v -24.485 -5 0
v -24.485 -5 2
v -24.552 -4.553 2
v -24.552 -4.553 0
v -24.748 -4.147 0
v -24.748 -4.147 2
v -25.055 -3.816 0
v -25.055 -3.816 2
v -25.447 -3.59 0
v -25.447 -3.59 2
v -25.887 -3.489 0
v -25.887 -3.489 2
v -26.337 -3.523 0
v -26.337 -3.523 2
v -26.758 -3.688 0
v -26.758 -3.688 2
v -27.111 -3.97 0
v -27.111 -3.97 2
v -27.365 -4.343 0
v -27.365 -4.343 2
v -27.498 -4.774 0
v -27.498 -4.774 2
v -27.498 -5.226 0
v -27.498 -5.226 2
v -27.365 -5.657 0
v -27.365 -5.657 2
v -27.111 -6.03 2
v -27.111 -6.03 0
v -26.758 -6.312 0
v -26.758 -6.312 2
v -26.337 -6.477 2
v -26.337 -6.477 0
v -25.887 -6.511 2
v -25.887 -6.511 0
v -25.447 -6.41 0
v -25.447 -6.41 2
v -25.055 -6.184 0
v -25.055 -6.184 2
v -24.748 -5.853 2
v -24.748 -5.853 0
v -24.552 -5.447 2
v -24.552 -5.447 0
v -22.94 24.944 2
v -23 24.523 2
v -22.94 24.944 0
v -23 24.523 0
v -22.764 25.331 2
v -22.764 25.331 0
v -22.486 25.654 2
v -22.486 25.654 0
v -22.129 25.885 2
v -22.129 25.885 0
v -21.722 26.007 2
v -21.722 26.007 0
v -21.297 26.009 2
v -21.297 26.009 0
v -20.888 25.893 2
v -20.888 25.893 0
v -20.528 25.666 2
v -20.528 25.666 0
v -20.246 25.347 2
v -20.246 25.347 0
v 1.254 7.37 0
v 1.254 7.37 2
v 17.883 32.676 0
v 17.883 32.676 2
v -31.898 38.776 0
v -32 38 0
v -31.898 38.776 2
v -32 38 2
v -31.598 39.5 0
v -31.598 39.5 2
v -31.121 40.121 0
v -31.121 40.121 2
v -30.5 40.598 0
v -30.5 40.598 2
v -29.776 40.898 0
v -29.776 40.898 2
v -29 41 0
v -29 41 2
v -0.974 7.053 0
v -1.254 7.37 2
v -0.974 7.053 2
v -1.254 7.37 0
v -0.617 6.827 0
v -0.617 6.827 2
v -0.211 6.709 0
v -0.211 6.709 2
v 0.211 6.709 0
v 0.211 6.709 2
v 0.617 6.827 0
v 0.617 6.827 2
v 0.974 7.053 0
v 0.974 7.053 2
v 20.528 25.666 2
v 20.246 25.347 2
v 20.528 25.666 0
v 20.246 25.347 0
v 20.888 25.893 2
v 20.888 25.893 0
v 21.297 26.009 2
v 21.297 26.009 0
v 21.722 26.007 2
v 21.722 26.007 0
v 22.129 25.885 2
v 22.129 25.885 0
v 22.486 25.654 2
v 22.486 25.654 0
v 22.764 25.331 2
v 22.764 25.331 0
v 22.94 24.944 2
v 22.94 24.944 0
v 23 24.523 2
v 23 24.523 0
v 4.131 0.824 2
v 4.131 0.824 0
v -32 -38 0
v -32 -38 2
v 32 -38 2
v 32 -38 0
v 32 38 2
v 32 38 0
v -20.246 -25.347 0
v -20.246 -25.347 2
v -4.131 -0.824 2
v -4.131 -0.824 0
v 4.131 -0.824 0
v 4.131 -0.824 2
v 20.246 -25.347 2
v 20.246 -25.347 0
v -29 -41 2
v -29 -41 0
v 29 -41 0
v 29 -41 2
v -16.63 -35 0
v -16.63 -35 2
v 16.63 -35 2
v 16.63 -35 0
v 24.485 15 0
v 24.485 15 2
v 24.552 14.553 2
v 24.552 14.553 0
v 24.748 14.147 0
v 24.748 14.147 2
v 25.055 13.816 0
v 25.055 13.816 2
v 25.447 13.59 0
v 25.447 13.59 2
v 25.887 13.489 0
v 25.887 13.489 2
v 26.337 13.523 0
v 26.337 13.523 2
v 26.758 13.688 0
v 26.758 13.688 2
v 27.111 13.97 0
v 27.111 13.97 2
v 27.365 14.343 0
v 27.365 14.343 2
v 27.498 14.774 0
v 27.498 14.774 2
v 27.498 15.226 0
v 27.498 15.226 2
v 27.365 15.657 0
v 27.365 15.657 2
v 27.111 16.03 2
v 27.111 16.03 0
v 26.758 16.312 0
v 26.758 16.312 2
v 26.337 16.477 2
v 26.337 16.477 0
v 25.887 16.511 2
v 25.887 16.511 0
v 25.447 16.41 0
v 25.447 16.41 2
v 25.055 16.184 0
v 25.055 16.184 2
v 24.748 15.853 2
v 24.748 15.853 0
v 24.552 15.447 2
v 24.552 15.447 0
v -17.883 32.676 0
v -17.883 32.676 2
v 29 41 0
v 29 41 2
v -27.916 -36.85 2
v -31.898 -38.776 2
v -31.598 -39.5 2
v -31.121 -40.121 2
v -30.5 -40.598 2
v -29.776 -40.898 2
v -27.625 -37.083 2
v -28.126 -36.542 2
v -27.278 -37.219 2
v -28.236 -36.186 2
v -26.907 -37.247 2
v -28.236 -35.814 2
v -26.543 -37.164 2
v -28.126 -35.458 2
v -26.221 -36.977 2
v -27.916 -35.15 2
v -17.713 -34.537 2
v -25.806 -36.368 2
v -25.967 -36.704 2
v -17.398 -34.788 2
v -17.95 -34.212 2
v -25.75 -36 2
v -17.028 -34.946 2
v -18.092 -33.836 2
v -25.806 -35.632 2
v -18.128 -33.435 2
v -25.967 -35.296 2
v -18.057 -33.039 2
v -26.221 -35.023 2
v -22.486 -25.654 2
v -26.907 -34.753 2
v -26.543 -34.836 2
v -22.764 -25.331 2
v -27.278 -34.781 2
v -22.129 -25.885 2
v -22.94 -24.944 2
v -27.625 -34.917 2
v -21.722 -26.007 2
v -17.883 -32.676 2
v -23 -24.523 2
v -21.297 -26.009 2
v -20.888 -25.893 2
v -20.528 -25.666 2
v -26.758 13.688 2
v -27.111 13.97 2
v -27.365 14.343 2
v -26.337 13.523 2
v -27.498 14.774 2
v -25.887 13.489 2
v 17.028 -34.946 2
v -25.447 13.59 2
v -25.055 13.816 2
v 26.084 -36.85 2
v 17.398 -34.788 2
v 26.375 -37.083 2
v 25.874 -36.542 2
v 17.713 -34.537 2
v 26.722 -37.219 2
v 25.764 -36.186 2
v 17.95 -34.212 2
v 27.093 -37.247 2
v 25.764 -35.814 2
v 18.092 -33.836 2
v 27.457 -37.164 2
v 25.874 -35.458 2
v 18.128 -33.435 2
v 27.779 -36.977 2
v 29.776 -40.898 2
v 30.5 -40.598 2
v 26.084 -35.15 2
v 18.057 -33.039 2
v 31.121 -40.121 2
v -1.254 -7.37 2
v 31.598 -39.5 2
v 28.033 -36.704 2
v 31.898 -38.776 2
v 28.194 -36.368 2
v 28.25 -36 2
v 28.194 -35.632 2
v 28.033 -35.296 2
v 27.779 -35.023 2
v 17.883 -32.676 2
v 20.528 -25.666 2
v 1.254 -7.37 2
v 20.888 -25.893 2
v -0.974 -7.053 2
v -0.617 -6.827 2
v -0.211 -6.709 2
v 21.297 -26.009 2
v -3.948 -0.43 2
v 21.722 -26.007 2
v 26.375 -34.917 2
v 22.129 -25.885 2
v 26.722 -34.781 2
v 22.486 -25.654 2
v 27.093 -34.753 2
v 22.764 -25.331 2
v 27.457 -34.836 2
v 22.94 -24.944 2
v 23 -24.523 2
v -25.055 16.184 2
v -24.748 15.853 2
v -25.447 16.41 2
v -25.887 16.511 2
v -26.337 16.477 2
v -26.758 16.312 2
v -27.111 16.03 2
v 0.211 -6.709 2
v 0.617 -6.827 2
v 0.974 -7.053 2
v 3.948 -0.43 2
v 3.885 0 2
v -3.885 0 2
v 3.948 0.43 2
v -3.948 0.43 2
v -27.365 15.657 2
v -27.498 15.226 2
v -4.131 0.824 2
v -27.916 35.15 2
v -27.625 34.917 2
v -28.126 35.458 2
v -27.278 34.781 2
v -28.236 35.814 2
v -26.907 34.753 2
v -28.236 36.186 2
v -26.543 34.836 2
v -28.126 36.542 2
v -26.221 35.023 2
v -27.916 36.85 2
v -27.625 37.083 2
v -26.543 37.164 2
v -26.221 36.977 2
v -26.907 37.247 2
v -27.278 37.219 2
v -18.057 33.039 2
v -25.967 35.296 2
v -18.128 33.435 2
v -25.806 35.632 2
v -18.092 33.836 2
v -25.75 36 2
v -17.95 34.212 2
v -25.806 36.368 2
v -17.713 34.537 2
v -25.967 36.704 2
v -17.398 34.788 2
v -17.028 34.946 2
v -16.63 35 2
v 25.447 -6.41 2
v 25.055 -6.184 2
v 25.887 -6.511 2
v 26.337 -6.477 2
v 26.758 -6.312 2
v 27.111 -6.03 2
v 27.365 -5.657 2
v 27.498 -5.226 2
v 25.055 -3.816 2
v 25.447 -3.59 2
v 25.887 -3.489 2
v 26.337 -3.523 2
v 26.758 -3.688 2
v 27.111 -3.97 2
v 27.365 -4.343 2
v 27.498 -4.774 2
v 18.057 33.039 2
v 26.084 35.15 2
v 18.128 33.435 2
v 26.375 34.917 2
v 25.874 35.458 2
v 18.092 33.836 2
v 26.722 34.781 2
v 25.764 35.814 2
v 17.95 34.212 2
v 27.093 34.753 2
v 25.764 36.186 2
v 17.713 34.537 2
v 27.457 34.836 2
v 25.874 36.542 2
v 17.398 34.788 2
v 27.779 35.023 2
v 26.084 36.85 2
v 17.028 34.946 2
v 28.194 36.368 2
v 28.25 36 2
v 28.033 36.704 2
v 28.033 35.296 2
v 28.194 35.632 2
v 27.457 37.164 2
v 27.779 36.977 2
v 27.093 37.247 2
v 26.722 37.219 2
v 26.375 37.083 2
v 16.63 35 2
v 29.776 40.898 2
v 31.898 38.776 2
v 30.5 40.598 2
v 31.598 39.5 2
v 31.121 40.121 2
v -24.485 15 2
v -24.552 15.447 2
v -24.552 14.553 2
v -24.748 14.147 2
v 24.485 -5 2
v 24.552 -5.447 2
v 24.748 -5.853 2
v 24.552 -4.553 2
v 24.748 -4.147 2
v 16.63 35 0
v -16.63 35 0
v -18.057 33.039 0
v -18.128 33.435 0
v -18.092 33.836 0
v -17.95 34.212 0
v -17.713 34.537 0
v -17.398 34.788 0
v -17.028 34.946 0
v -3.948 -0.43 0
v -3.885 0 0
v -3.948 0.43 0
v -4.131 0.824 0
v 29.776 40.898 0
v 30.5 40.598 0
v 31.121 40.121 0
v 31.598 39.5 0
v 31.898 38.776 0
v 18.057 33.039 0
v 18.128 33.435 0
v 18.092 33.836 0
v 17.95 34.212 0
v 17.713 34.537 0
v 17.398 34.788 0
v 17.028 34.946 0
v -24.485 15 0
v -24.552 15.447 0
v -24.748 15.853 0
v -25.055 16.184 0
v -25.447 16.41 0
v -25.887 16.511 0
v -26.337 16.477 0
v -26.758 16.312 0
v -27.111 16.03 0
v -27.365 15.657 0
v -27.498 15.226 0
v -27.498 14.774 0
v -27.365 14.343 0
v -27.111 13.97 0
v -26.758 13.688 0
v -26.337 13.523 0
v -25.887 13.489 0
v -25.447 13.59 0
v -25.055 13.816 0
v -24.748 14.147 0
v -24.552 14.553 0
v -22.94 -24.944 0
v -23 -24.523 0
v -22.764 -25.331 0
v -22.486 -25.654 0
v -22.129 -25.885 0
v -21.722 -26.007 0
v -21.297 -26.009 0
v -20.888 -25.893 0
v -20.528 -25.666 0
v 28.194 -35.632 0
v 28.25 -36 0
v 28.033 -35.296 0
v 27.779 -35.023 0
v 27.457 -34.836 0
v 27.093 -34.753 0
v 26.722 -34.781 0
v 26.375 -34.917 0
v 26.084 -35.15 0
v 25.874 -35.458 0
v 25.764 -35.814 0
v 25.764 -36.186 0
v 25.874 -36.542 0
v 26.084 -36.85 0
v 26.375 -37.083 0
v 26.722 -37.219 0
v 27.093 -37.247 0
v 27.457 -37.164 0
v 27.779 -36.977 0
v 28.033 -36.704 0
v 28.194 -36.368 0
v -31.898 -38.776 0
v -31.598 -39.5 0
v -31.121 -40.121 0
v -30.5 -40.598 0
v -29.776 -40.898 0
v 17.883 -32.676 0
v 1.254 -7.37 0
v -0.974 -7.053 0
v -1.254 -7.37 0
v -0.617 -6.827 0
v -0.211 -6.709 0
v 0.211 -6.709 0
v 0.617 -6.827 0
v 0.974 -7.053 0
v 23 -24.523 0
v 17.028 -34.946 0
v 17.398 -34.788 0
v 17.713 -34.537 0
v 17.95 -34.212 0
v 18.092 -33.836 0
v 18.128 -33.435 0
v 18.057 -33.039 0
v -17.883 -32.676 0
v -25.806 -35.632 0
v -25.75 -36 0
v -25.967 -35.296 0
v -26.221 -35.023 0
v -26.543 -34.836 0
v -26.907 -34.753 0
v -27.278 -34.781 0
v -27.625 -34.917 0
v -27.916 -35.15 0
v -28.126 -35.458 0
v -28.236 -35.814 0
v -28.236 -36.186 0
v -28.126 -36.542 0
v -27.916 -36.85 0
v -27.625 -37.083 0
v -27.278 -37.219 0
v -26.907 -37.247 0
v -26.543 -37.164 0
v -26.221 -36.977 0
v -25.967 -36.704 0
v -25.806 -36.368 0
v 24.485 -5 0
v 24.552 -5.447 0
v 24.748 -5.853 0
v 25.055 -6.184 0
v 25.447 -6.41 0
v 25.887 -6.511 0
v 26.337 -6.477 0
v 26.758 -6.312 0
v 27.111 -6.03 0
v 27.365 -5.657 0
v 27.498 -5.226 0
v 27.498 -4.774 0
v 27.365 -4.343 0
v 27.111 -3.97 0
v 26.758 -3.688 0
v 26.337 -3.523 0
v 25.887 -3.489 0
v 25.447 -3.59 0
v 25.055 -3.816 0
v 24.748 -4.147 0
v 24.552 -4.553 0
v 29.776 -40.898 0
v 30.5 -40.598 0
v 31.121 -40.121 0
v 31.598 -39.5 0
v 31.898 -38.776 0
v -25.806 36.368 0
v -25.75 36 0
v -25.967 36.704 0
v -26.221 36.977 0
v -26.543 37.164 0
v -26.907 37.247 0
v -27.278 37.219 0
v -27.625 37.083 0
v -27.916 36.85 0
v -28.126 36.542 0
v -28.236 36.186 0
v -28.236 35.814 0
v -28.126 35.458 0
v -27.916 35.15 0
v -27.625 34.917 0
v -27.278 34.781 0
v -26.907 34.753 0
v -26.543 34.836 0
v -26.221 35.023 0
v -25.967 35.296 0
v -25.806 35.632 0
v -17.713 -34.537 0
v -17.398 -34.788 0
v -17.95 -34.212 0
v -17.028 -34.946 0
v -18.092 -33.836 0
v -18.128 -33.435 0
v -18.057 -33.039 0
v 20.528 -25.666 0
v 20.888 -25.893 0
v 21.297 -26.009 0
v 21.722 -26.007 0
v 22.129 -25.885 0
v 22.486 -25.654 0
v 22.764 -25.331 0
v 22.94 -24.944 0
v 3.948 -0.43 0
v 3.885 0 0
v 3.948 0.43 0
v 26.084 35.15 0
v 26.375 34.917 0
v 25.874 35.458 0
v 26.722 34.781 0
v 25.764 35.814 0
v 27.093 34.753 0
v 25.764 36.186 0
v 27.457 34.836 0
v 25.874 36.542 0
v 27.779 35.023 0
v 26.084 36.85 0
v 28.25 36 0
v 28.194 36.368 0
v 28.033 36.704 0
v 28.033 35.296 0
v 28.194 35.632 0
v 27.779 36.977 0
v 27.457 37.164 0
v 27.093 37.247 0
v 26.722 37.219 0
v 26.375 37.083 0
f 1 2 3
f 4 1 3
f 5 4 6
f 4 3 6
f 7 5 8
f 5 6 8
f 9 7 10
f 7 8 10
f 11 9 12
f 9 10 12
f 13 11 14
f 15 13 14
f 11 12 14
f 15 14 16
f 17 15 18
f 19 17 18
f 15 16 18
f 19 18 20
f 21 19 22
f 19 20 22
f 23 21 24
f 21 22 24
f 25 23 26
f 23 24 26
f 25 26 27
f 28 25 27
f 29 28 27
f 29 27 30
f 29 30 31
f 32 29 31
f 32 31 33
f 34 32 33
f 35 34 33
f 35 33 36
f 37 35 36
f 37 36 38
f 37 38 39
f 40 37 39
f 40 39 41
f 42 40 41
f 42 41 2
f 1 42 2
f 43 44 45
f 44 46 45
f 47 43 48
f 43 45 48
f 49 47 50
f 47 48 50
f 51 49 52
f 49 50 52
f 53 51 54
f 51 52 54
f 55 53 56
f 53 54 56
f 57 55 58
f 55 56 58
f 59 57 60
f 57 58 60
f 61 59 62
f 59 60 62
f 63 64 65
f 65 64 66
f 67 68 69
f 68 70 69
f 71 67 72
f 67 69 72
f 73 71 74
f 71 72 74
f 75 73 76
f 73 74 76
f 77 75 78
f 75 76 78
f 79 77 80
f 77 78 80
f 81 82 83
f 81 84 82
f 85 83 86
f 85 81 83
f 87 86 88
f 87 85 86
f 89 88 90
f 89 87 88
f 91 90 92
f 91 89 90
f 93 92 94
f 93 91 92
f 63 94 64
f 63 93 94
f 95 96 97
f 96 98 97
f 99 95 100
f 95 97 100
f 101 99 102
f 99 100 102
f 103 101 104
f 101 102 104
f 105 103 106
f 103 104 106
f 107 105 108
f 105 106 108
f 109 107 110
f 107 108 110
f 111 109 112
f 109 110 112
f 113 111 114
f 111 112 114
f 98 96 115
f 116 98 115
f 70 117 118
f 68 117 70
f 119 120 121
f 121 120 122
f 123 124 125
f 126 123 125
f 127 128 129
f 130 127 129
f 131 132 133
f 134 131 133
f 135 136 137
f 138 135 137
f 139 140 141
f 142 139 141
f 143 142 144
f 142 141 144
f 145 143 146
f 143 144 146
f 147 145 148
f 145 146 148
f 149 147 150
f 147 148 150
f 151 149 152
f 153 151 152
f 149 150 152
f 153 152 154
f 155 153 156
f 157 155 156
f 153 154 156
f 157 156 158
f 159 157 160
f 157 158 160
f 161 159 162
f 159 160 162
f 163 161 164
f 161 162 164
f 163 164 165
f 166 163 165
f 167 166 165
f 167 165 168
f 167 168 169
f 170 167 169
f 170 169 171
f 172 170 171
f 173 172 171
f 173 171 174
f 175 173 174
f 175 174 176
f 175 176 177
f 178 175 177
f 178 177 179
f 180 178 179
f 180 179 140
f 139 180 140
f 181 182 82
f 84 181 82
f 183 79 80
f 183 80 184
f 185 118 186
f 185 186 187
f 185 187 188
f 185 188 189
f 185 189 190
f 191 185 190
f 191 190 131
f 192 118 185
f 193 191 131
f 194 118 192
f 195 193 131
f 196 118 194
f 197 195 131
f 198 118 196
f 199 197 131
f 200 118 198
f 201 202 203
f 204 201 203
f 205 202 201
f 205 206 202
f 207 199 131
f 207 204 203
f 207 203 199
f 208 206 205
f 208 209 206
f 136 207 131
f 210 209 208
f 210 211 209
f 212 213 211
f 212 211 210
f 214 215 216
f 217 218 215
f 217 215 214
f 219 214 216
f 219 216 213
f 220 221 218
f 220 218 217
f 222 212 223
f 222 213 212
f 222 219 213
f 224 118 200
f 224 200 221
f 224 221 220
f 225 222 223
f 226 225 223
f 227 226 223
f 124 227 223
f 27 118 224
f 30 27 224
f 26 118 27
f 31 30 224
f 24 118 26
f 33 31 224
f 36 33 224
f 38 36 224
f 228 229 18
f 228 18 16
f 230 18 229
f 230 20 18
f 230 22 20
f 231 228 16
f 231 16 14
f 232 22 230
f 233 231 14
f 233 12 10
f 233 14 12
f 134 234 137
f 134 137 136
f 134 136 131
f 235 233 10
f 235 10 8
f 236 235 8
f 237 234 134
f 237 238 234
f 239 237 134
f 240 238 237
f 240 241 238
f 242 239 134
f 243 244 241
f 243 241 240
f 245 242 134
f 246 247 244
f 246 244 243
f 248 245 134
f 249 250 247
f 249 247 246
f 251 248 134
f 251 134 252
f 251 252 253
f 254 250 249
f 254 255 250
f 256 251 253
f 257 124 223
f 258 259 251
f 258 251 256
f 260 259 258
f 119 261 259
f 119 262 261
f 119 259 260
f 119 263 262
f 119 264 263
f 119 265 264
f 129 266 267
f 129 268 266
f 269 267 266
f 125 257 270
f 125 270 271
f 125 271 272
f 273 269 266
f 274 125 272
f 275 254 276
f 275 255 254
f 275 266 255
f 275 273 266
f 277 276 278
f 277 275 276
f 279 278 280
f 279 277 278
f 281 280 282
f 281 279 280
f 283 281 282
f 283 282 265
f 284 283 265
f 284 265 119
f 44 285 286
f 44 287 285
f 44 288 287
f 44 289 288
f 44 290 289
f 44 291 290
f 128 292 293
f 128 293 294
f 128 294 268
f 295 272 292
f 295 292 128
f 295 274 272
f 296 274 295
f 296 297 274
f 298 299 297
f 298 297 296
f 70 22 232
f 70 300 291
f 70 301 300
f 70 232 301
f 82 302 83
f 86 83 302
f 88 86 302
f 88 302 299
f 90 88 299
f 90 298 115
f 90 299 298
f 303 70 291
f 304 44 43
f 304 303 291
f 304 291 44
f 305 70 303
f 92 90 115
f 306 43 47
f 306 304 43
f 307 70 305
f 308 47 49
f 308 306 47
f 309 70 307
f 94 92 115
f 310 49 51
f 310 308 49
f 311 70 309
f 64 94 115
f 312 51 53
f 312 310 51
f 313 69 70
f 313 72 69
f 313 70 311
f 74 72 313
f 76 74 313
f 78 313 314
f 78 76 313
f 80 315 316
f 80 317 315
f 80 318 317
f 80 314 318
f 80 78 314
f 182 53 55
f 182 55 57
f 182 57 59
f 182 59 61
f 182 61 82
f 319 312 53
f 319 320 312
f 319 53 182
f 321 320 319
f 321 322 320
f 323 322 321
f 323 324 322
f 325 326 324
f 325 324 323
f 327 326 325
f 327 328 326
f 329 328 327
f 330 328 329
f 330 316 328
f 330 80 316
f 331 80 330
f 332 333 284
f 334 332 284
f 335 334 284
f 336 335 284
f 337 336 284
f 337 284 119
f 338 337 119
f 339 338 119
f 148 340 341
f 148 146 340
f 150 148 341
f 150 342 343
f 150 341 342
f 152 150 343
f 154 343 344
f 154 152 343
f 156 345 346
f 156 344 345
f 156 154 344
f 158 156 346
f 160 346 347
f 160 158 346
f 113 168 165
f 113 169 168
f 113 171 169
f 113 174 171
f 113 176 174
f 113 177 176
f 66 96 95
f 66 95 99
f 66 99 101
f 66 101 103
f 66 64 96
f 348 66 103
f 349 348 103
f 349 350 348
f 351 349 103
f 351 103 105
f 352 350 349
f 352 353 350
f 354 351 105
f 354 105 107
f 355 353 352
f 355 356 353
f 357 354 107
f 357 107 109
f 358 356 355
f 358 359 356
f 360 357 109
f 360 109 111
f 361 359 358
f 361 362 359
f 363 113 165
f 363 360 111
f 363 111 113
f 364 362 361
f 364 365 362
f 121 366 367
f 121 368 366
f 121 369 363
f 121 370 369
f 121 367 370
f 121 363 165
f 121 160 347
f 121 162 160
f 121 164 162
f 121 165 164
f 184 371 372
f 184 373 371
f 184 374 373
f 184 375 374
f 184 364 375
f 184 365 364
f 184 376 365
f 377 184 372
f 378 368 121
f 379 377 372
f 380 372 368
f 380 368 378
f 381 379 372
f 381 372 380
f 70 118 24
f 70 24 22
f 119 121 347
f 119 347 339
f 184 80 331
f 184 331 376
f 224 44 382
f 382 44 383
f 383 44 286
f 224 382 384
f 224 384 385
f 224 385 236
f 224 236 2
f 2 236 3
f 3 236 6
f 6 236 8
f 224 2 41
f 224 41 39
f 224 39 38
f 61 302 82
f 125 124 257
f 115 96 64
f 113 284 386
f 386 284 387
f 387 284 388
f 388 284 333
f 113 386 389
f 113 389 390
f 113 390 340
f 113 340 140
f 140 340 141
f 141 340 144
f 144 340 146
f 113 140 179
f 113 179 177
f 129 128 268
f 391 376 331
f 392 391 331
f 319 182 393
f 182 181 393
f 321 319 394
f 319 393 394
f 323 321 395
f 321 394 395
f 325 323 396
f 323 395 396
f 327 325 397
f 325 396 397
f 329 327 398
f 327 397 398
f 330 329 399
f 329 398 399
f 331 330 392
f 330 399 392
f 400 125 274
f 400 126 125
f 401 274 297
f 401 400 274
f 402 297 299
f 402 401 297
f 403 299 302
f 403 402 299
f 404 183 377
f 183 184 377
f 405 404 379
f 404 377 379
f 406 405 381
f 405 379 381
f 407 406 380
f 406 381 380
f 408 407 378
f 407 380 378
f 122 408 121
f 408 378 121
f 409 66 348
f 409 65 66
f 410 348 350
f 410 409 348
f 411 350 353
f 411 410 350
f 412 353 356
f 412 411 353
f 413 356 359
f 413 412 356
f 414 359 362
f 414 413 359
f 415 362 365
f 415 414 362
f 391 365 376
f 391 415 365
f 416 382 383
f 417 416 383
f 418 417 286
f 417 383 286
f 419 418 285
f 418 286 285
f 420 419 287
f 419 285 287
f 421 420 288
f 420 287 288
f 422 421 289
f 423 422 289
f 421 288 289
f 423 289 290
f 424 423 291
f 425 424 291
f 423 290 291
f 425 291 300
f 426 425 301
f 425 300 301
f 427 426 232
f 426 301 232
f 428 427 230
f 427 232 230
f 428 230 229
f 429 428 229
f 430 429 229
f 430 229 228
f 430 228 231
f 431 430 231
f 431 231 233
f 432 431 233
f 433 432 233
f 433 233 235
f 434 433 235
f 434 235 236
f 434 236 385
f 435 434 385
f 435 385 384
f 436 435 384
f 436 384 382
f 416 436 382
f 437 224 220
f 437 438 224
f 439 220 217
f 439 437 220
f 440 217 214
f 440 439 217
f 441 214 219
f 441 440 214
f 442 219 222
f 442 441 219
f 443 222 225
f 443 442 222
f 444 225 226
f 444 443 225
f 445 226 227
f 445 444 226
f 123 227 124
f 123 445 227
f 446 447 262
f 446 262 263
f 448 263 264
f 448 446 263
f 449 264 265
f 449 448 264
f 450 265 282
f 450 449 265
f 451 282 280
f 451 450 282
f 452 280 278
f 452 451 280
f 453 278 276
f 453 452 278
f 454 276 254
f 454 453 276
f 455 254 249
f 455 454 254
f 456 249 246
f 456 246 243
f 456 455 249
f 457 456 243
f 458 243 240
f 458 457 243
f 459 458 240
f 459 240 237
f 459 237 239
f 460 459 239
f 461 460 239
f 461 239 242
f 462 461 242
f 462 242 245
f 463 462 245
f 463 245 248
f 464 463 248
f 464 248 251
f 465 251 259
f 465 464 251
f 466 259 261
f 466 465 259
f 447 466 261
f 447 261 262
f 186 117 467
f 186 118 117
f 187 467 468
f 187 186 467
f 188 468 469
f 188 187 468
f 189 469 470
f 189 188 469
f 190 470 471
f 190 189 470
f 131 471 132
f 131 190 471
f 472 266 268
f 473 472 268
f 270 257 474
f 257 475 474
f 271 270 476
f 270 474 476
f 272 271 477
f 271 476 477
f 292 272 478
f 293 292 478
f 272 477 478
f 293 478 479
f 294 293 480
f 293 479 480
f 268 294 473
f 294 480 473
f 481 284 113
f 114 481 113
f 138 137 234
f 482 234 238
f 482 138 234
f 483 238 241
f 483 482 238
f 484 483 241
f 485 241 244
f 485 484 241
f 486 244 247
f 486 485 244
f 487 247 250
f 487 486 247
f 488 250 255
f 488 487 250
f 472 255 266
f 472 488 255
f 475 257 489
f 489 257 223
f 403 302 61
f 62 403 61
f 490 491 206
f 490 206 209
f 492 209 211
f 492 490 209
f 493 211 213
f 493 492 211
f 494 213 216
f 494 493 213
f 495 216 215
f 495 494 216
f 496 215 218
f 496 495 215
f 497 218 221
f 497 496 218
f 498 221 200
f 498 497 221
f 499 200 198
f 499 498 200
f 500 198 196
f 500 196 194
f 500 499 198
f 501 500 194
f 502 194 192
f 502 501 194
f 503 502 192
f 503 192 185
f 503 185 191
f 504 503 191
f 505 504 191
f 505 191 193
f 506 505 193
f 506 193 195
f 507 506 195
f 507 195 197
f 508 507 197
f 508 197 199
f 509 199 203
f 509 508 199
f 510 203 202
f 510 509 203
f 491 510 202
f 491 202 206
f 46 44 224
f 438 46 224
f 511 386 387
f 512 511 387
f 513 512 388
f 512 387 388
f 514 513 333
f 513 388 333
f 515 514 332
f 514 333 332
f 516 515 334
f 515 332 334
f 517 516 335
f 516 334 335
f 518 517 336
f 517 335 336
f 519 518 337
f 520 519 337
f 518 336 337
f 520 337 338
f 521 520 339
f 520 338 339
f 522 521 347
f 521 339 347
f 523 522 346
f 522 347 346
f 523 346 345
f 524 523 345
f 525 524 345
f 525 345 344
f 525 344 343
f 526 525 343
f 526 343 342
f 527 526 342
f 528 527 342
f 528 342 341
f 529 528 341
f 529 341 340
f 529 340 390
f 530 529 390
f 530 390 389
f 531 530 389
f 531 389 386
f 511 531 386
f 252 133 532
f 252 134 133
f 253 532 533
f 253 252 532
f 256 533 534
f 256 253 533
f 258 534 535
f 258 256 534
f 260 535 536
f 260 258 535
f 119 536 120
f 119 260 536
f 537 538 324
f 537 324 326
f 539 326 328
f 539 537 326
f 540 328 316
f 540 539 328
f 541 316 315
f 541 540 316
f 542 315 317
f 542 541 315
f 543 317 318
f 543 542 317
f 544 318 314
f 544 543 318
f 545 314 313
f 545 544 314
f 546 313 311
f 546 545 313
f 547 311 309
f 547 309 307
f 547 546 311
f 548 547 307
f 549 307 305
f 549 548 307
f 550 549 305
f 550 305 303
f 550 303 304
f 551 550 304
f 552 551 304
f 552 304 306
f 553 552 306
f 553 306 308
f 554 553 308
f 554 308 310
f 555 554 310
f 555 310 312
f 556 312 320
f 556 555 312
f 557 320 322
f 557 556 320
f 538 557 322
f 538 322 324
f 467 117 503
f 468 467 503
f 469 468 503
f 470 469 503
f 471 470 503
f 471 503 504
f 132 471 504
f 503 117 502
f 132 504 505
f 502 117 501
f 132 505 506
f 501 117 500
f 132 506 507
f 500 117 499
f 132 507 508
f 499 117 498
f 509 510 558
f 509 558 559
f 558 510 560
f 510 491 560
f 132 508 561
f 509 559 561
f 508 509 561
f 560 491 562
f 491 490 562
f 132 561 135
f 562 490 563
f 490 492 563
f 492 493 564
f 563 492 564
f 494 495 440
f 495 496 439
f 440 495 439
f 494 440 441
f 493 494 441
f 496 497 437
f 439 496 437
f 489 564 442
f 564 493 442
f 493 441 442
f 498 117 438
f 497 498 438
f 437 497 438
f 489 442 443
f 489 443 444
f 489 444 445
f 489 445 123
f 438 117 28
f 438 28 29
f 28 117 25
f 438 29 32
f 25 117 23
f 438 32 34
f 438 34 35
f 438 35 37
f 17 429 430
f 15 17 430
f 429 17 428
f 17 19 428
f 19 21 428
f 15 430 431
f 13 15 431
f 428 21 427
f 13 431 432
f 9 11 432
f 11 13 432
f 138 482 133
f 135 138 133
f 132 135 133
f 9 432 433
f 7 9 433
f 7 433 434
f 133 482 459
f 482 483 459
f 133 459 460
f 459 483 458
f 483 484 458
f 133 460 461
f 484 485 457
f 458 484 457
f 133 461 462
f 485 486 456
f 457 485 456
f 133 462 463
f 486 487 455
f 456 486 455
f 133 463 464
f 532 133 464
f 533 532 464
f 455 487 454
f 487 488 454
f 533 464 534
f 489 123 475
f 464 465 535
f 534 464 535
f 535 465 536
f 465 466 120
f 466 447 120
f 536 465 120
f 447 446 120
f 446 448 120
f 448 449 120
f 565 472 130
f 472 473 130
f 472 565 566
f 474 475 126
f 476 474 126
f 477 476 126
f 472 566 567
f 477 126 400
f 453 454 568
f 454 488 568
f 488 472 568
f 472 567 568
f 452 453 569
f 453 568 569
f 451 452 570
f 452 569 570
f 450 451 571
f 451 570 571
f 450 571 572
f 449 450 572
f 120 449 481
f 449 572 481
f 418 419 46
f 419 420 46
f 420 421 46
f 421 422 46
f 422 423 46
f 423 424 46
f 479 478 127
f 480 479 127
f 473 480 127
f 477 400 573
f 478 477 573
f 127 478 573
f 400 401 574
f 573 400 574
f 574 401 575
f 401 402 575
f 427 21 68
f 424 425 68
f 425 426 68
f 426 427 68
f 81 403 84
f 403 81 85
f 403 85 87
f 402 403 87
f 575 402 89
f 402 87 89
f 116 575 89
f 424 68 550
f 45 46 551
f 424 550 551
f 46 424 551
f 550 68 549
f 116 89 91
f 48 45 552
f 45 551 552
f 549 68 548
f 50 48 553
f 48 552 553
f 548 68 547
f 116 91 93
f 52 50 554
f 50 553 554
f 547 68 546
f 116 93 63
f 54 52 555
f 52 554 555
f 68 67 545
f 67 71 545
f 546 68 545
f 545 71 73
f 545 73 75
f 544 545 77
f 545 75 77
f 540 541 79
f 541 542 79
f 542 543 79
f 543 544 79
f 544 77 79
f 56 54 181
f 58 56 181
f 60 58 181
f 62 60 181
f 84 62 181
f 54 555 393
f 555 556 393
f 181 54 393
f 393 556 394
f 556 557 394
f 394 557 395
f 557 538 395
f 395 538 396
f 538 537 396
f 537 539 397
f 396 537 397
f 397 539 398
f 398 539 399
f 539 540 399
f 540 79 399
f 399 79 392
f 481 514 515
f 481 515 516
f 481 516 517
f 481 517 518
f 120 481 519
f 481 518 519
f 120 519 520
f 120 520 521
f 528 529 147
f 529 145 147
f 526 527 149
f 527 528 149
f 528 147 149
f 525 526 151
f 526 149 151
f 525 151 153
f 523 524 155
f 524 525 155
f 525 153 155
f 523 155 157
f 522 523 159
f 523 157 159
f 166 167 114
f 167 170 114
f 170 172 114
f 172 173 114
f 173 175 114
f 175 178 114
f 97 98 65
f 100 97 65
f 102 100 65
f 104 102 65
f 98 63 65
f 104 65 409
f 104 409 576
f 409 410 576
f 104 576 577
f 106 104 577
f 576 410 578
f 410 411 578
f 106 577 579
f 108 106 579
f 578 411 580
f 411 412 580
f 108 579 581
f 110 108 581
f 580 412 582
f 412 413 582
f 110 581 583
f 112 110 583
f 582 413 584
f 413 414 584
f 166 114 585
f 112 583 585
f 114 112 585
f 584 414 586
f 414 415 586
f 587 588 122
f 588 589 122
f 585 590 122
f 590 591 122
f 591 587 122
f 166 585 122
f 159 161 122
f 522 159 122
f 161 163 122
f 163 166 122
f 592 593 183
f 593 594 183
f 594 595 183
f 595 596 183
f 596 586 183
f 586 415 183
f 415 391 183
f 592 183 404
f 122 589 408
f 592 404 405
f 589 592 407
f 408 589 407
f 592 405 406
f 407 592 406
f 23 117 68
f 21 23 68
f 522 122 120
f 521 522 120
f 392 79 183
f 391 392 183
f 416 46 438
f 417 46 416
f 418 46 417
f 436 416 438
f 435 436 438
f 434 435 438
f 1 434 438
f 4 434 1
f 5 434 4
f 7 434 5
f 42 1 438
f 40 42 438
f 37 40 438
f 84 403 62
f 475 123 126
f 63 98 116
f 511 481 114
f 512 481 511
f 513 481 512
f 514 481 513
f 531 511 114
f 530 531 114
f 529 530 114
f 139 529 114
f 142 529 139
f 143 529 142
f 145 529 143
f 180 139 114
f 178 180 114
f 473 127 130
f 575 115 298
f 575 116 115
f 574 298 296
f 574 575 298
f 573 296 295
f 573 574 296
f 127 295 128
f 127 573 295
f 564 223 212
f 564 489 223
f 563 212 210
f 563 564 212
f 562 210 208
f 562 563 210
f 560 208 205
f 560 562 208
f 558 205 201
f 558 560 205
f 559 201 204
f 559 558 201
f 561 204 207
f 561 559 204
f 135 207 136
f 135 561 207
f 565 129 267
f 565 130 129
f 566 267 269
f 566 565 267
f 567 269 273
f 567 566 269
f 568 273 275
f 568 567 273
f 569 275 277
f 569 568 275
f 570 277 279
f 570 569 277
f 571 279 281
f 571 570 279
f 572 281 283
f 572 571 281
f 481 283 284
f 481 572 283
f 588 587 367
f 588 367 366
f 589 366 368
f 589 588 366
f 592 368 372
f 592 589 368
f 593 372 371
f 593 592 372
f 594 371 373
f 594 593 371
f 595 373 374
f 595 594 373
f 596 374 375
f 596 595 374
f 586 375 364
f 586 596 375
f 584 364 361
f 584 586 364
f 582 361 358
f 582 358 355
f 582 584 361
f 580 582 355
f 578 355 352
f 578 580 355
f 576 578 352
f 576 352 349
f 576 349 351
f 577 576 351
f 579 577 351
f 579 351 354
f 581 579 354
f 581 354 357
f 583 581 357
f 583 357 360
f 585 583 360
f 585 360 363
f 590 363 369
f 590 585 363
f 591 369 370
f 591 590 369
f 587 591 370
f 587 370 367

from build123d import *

# Parameters (mm, degrees)
SKETCH_1_W          = 64
SKETCH_1_H          = 82
SKETCH_1_R          = 1.25
EXTRUDE_1_DEPTH     = 2
FILLET_1_R          = 3
SKETCH_3_R          = 1.515
CUT_EXTRUDE_1_DEPTH = 10
CUT_EXTRUDE_2_DEPTH = 10
FILLET_2_R          = 1.5


with BuildPart() as part:
    # 草图1 → 凸台-拉伸1 (new body)
    with BuildSketch(Plane.XY):
        Rectangle(SKETCH_1_W, SKETCH_1_H)
        with Locations((-27, 36)):
            Circle(SKETCH_1_R, mode=Mode.SUBTRACT)
        with Locations((27, 36)):
            Circle(SKETCH_1_R, mode=Mode.SUBTRACT)
        with Locations((27, -36)):
            Circle(SKETCH_1_R, mode=Mode.SUBTRACT)
        with Locations((-27, -36)):
            Circle(SKETCH_1_R, mode=Mode.SUBTRACT)
    extrude(amount=EXTRUDE_1_DEPTH)

    # 圆角1
    fillet_1_edges = [part.edges().sort_by_distance(p)[0] for p in [
        (32, -41, 1),
        (-32, -41, 1),
        (-32, 41, 1),
        (32, 41, 1),
    ]]
    fillet(fillet_1_edges, radius=FILLET_1_R)

    # 草图3 → 切除-拉伸1 (cut)
    with BuildSketch(Plane.XY.offset(2)):
        with Locations((-26, 15)):
            Circle(SKETCH_3_R)
        with Locations((-26, -5)):
            Circle(SKETCH_3_R)
        with Locations(Location((26, -5, 0), (0, 0, 180))):
            Circle(SKETCH_3_R)
        with Locations(Location((26, 15, 0), (0, 0, 180))):
            Circle(SKETCH_3_R)
    extrude(amount=-CUT_EXTRUDE_1_DEPTH, mode=Mode.SUBTRACT)

    # 草图4 → 切除-拉伸2 (cut)
    with BuildSketch(Plane.XY.offset(2)):
        Polygon((-23, 29.53728915), (-23, -29.53728915), (-3.589781416, 0), align=None)
        Polygon((-19.410218584, 35), (0, 5.46271085), (19.410218584, 35), align=None)
        Polygon((23, 29.53728915), (3.589781416, 0), (23, -29.53728915), align=None)
        Polygon((0, -5.46271085), (-19.410218584, -35), (19.410218584, -35), align=None)
    extrude(amount=-CUT_EXTRUDE_2_DEPTH, mode=Mode.SUBTRACT)

    # 圆角2
    fillet_2_edges = [part.edges().sort_by_distance(p)[0] for p in [
        (0, -5.46271085, 1),
        (19.410218584, -35, 1),
        (-19.410218584, -35, 1),
        (-23, 29.53728915, 1),
        (-3.589781416, 0, 1),
        (-23, -29.53728915, 1),
        (3.589781416, 0, 1),
        (23, 29.53728915, 1),
        (23, -29.53728915, 1),
        (-19.410218584, 35, 1),
        (19.410218584, 35, 1),
        (0, 5.46271085, 1),
    ]]
    fillet(fillet_2_edges, radius=FILLET_2_R)


solid = part.part
